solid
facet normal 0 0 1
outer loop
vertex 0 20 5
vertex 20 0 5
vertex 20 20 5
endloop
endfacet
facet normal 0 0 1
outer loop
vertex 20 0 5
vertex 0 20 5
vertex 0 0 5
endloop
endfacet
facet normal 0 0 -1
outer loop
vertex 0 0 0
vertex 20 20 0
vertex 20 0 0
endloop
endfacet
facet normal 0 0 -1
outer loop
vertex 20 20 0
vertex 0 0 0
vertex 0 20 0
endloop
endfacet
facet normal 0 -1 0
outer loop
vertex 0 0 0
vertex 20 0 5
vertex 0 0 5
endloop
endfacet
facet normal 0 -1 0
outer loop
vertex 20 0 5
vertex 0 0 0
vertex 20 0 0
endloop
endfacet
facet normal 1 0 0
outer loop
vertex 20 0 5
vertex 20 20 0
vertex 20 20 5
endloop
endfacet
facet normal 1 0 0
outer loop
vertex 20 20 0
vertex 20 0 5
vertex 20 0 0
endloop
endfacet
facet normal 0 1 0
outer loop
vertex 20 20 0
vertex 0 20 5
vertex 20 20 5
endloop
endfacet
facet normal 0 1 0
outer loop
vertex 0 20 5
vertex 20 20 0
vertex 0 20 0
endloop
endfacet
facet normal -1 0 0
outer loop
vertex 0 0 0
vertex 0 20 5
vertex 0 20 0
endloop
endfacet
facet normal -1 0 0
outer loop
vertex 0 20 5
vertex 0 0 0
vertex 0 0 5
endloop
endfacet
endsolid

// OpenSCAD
module roundedBox(
    size
) {
    cube(size);
}



roundedBox(
    size = [20, 20, 5]
);
